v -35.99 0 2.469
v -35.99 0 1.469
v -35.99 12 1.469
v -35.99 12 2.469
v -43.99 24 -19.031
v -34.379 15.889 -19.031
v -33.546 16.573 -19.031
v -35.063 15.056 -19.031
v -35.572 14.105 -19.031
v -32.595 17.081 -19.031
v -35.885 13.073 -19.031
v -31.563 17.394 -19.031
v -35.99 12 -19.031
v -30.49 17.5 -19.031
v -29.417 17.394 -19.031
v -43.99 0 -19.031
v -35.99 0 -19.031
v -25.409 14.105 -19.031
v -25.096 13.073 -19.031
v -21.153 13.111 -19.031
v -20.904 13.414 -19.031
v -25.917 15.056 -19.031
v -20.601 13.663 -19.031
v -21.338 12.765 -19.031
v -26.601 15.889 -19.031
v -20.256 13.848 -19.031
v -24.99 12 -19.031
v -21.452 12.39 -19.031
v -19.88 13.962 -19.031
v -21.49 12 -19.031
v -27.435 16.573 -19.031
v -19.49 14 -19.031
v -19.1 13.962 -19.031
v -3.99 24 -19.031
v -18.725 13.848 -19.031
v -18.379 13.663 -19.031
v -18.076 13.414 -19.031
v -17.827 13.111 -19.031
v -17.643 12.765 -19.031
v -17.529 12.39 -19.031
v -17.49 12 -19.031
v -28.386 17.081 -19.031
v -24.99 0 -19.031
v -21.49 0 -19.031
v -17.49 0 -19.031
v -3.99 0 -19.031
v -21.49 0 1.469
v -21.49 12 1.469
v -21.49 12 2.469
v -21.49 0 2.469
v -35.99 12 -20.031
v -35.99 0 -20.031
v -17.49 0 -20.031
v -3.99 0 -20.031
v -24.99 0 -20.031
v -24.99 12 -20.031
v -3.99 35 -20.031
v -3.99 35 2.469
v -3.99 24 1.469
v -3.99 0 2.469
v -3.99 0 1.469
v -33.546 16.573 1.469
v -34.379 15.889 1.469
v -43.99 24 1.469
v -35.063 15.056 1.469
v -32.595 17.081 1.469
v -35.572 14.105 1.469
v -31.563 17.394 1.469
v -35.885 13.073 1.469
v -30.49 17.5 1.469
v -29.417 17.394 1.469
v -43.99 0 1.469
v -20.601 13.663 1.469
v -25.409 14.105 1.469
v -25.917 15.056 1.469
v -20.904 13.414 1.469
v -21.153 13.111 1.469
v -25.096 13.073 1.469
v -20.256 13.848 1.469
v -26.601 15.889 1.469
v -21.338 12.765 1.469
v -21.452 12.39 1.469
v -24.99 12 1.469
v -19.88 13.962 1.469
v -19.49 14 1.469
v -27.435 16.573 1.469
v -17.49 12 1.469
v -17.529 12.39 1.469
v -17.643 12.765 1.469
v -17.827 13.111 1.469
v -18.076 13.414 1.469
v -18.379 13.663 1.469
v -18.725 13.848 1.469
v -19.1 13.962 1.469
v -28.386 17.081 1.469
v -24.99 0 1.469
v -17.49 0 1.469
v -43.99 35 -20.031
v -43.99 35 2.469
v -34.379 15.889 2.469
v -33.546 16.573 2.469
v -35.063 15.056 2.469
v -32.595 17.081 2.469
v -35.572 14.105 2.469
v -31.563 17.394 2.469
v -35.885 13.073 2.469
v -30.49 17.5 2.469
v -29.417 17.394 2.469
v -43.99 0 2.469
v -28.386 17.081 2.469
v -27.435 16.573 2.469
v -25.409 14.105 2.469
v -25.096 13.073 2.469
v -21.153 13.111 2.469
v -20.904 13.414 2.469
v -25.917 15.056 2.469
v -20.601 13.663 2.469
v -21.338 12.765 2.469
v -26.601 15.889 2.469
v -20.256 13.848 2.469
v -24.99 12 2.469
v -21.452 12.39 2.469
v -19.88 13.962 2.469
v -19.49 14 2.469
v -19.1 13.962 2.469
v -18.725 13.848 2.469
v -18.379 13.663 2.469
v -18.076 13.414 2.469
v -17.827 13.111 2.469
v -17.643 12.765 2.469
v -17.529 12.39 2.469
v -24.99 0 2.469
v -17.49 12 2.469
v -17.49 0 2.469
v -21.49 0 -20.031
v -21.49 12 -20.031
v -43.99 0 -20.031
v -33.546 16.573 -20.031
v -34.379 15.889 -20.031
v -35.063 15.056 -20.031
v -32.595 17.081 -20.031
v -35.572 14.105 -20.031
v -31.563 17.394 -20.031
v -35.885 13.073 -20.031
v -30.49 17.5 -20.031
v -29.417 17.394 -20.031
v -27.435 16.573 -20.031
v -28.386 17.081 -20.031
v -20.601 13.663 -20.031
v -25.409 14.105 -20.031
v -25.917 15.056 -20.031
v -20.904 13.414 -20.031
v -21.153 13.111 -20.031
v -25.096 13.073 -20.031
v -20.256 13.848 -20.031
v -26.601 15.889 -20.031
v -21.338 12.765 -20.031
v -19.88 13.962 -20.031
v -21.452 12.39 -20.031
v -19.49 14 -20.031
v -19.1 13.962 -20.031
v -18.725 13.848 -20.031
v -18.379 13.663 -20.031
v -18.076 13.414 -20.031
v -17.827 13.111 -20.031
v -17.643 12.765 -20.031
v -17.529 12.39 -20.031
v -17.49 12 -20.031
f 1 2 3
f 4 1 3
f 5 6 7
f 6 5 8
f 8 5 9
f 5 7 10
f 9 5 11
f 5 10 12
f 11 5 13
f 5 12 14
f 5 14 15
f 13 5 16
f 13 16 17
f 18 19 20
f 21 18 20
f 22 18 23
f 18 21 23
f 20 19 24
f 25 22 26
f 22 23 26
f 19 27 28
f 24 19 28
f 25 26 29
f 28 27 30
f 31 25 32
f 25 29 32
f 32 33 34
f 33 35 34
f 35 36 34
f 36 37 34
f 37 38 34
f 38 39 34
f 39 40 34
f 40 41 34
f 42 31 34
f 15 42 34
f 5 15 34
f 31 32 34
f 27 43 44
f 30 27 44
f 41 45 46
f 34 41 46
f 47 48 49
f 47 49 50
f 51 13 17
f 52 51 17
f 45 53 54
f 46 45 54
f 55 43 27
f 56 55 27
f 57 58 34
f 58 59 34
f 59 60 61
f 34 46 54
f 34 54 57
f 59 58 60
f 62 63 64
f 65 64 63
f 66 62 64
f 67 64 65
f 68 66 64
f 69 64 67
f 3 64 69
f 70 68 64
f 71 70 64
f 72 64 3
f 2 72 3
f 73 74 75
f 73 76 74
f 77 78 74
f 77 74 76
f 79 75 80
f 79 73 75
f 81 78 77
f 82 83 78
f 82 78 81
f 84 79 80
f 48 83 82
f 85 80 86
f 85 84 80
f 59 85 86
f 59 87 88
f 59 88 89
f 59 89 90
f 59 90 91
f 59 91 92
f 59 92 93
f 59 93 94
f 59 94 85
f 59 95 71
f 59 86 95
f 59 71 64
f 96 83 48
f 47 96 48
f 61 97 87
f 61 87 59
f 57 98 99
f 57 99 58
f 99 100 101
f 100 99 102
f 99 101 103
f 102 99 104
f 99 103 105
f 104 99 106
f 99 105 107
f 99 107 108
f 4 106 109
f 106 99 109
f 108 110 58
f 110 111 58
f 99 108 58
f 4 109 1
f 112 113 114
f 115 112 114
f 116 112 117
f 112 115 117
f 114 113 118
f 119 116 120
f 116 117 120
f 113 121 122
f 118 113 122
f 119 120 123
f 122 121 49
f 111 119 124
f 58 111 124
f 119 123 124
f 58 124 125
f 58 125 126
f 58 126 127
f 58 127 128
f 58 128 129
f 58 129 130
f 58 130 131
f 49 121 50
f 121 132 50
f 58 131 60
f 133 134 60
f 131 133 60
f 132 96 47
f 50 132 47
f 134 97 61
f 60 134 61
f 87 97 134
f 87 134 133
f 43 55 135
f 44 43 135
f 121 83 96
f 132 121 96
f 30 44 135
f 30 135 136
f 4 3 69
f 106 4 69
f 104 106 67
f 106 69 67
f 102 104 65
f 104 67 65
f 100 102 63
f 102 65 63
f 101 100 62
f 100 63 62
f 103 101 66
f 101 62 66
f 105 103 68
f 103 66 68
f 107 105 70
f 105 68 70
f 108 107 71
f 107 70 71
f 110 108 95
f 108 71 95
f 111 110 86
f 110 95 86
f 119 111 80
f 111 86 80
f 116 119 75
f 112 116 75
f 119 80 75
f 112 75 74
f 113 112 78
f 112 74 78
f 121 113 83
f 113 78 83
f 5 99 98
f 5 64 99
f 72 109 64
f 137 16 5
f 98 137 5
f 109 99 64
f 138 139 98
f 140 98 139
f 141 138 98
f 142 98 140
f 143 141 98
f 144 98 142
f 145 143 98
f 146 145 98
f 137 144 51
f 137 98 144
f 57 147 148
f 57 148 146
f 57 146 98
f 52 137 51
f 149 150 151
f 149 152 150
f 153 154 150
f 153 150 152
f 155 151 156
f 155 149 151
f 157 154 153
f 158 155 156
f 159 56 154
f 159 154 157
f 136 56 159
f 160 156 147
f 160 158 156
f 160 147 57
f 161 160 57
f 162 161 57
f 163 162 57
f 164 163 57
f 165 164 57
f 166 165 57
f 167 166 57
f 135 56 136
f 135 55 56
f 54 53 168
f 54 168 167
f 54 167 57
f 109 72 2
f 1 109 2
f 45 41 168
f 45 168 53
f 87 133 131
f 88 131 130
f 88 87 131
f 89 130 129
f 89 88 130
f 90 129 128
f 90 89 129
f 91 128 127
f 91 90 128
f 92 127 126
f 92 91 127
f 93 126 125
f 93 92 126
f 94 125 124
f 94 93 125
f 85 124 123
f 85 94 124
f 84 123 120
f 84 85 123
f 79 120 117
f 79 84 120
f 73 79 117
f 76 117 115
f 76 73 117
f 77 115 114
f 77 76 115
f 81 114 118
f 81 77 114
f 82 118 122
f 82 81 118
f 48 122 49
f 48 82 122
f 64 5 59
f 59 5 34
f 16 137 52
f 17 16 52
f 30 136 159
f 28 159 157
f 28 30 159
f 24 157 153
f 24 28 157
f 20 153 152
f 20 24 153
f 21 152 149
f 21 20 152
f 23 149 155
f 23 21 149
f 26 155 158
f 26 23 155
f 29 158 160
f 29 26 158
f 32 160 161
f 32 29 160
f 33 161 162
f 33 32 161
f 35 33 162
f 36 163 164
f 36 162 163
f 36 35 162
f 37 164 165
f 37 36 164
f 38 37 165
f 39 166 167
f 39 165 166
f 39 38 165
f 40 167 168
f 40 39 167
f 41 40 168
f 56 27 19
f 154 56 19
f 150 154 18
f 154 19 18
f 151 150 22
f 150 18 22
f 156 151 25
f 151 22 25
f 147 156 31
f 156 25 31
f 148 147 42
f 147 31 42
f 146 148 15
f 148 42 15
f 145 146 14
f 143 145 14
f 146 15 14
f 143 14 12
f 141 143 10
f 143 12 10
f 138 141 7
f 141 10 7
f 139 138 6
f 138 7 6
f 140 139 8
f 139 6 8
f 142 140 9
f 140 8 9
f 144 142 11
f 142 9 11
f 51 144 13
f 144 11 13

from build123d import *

# Parameters (mm, degrees)
SKETCH_2_W                = 40
SKETCH_2_H                = 22.5
EXTRUDE_2_DEPTH           = 25
SHELL_3_T                 = -1
CUT_EXTRUDE_2_DEPTH       = 56.37502058
CUT_EXTRUDE_2_DEPTH_BACK  = 1
CUT_EXTRUDE_10_DEPTH      = 56.37502058
CUT_EXTRUDE_10_DEPTH_BACK = 1
SKETCH_6_W                = 40
SKETCH_6_H                = 22.5
EXTRUDE_3_DEPTH           = 10


with BuildPart() as part:
    # 草图2 → 凸台-拉伸2 (new body)
    with BuildSketch(Plane(origin=(0, 0, 0), x_dir=(1, 0, 0), z_dir=(0, 1, 0))):
        with Locations((-23.990259198, 8.7812953)):
            Rectangle(SKETCH_2_W, SKETCH_2_H)
    extrude(amount=EXTRUDE_2_DEPTH)

    # 抽壳3
    shell_3_openings = [part.faces().sort_by_distance(p)[0] for p in [
        (-23.990259198, 0, -8.7812953),
        (-3.990259198, 12.5, -8.7812953),
        (-43.990259198, 12.5, -8.7812953),
    ]]
    offset(amount=SHELL_3_T, openings=shell_3_openings, kind=Kind.INTERSECTION)

    # 草图4 → 切除-拉伸2 (cut, two sides: drawn at the far end of the back side and taken through both)
    with BuildSketch(Plane.XY.offset(2.4687047).offset(-CUT_EXTRUDE_2_DEPTH_BACK)):
        with BuildLine():
            Line((-24.990259198, 12), (-24.990259198, 0))
            Line((-24.990259198, 0), (-35.990259198, 0))
            Line((-35.990259198, 0), (-35.990259198, 12))
            ThreePointArc((-35.990259198, 12), (-30.490259198, 17.5), (-24.990259198, 12))
        make_face()
        with BuildLine():
            Line((-21.490259198, 12), (-21.490259198, 0))
            Line((-21.490259198, 0), (-17.490259198, 0))
            Line((-17.490259198, 0), (-17.490259198, 12))
            ThreePointArc((-17.490259198, 12), (-19.490259198, 14), (-21.490259198, 12))
        make_face()
    extrude(amount=CUT_EXTRUDE_2_DEPTH + CUT_EXTRUDE_2_DEPTH_BACK, mode=Mode.SUBTRACT)

    # 草图5 → 切除-拉伸10 (cut, two sides: drawn at the far end of the back side and taken through both)
    with BuildSketch(Plane(origin=(0, 0, -20.0312953), x_dir=(-1, 0, 0), z_dir=(0, 0, -1)).offset(-CUT_EXTRUDE_10_DEPTH_BACK)):
        with BuildLine():
            Line((35.990259198, 12), (35.990259198, 0))
            Line((35.990259198, 0), (24.990259198, 0))
            Line((24.990259198, 0), (24.990259198, 12))
            ThreePointArc((24.990259198, 12), (30.490259198, 17.5), (35.990259198, 12))
        make_face()
        with BuildLine():
            Line((17.490259198, 12), (17.490259198, 0))
            Line((17.490259198, 0), (21.490259198, 0))
            Line((21.490259198, 0), (21.490259198, 12))
            ThreePointArc((21.490259198, 12), (19.490259198, 14), (17.490259198, 12))
        make_face()
    extrude(amount=CUT_EXTRUDE_10_DEPTH + CUT_EXTRUDE_10_DEPTH_BACK, mode=Mode.SUBTRACT)

    # 草图6 → 凸台-拉伸3 (add)
    with BuildSketch(Plane(origin=(0, 25, 0), x_dir=(1, 0, 0), z_dir=(0, 1, 0))):
        with Locations((-23.990259198, 8.7812953)):
            Rectangle(SKETCH_6_W, SKETCH_6_H)
    extrude(amount=EXTRUDE_3_DEPTH)


solid = part.part
